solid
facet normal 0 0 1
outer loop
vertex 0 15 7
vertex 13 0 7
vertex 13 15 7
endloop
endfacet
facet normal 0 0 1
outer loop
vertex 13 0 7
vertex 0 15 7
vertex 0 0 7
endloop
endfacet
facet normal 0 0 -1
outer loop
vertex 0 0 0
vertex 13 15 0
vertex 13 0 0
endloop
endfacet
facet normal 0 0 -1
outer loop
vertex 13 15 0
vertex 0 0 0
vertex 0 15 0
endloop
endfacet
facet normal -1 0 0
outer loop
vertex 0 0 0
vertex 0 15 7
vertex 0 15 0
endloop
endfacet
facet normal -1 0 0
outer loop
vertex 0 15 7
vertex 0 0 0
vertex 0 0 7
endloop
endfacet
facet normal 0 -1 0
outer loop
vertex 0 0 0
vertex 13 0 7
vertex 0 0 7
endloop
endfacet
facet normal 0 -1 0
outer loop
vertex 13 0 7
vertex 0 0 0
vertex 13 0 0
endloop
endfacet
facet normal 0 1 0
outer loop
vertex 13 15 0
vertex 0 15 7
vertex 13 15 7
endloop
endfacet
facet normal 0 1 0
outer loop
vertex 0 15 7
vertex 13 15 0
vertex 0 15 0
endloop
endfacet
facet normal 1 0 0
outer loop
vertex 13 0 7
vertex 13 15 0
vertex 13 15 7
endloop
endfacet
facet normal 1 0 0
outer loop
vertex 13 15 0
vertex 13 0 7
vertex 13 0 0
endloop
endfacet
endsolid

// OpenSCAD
translate([2.5, 1.5, 3.5]) color([0.42693558751800065, 0.7548278934255565, 0.8293384268467949]) cube([5, 3, 7], center=true);
translate([7.5, 1.5, 3.5]) color([0.039351686529191854, 0.1803893912563338, 0.490013452023644]) cube([5, 3, 7], center=true);
translate([2.5, 4.5, 3.5]) color([0.12808547795160863, 0.8710926419421733, 0.9344608884461488]) cube([5, 3, 7], center=true);
translate([7.5, 4.5, 3.5]) color([0.3195969983538176, 0.43484368255202, 0.5570540644200566]) cube([5, 3, 7], center=true);
translate([2.5, 7.5, 3.5]) color([0.2855057910835891, 0.5410756974595614, 0.2011850454737838]) cube([5, 3, 7], center=true);
translate([7.5, 7.5, 3.5]) color([0.2966412512769129, 0.44178363318767744, 0.604669902191143]) cube([5, 3, 7], center=true);
translate([2.5, 10.5, 3.5]) color([0.5361650260862432, 0.2609879767339395, 0.23178787541805523]) cube([5, 3, 7], center=true);
translate([7.5, 10.5, 3.5]) color([0.11873023670071103, 0.7834936358921726, 0.09890076646638046]) cube([5, 3, 7], center=true);
translate([2.5, 13.5, 3.5]) color([0.7328850061793606, 0.2487736956630997, 0.28455698400578255]) cube([5, 3, 7], center=true);
translate([7.5, 13.5, 3.5]) color([0.7360834330107994, 0.6596207917216363, 0.7419215555155583]) cube([5, 3, 7], center=true);
translate([11.5, 2.5, 3.5]) color([0.5152830587943614, 0.8590958196652707, 0.12179389137547159]) cube([3, 5, 7], center=true);
translate([11.5, 7.5, 1.0]) color([0.6451969614065052, 0.11824431248865597, 0.7372833681454282]) cube([3, 5, 2], center=true);
translate([11.5, 12.5, 1.0]) color([0.3589046614584527, 0.67488210437111, 0.7034839134412817]) cube([3, 5, 2], center=true);
translate([11.5, 6.0, 4.5]) color([0.6606084576410584, 0.22155798032782648, 0.8317998863873537]) cube([3, 2, 5], center=true);
translate([11.5, 8.0, 4.5]) color([0.24013608742346748, 0.5181532972121122, 0.6746457541533513]) cube([3, 2, 5], center=true);
translate([11.5, 10.0, 4.5]) color([0.23360317478475656, 0.628511722983939, 0.2868310479973286]) cube([3, 2, 5], center=true);
translate([11.5, 12.0, 4.5]) color([0.1713823760843869, 0.809748828526577, 0.5531227700773604]) cube([3, 2, 5], center=true);
translate([11.5, 14.0, 4.5]) color([0.32788470660885605, 0.5854309472055399, 0.025286397427288332]) cube([3, 2, 5], center=true);
